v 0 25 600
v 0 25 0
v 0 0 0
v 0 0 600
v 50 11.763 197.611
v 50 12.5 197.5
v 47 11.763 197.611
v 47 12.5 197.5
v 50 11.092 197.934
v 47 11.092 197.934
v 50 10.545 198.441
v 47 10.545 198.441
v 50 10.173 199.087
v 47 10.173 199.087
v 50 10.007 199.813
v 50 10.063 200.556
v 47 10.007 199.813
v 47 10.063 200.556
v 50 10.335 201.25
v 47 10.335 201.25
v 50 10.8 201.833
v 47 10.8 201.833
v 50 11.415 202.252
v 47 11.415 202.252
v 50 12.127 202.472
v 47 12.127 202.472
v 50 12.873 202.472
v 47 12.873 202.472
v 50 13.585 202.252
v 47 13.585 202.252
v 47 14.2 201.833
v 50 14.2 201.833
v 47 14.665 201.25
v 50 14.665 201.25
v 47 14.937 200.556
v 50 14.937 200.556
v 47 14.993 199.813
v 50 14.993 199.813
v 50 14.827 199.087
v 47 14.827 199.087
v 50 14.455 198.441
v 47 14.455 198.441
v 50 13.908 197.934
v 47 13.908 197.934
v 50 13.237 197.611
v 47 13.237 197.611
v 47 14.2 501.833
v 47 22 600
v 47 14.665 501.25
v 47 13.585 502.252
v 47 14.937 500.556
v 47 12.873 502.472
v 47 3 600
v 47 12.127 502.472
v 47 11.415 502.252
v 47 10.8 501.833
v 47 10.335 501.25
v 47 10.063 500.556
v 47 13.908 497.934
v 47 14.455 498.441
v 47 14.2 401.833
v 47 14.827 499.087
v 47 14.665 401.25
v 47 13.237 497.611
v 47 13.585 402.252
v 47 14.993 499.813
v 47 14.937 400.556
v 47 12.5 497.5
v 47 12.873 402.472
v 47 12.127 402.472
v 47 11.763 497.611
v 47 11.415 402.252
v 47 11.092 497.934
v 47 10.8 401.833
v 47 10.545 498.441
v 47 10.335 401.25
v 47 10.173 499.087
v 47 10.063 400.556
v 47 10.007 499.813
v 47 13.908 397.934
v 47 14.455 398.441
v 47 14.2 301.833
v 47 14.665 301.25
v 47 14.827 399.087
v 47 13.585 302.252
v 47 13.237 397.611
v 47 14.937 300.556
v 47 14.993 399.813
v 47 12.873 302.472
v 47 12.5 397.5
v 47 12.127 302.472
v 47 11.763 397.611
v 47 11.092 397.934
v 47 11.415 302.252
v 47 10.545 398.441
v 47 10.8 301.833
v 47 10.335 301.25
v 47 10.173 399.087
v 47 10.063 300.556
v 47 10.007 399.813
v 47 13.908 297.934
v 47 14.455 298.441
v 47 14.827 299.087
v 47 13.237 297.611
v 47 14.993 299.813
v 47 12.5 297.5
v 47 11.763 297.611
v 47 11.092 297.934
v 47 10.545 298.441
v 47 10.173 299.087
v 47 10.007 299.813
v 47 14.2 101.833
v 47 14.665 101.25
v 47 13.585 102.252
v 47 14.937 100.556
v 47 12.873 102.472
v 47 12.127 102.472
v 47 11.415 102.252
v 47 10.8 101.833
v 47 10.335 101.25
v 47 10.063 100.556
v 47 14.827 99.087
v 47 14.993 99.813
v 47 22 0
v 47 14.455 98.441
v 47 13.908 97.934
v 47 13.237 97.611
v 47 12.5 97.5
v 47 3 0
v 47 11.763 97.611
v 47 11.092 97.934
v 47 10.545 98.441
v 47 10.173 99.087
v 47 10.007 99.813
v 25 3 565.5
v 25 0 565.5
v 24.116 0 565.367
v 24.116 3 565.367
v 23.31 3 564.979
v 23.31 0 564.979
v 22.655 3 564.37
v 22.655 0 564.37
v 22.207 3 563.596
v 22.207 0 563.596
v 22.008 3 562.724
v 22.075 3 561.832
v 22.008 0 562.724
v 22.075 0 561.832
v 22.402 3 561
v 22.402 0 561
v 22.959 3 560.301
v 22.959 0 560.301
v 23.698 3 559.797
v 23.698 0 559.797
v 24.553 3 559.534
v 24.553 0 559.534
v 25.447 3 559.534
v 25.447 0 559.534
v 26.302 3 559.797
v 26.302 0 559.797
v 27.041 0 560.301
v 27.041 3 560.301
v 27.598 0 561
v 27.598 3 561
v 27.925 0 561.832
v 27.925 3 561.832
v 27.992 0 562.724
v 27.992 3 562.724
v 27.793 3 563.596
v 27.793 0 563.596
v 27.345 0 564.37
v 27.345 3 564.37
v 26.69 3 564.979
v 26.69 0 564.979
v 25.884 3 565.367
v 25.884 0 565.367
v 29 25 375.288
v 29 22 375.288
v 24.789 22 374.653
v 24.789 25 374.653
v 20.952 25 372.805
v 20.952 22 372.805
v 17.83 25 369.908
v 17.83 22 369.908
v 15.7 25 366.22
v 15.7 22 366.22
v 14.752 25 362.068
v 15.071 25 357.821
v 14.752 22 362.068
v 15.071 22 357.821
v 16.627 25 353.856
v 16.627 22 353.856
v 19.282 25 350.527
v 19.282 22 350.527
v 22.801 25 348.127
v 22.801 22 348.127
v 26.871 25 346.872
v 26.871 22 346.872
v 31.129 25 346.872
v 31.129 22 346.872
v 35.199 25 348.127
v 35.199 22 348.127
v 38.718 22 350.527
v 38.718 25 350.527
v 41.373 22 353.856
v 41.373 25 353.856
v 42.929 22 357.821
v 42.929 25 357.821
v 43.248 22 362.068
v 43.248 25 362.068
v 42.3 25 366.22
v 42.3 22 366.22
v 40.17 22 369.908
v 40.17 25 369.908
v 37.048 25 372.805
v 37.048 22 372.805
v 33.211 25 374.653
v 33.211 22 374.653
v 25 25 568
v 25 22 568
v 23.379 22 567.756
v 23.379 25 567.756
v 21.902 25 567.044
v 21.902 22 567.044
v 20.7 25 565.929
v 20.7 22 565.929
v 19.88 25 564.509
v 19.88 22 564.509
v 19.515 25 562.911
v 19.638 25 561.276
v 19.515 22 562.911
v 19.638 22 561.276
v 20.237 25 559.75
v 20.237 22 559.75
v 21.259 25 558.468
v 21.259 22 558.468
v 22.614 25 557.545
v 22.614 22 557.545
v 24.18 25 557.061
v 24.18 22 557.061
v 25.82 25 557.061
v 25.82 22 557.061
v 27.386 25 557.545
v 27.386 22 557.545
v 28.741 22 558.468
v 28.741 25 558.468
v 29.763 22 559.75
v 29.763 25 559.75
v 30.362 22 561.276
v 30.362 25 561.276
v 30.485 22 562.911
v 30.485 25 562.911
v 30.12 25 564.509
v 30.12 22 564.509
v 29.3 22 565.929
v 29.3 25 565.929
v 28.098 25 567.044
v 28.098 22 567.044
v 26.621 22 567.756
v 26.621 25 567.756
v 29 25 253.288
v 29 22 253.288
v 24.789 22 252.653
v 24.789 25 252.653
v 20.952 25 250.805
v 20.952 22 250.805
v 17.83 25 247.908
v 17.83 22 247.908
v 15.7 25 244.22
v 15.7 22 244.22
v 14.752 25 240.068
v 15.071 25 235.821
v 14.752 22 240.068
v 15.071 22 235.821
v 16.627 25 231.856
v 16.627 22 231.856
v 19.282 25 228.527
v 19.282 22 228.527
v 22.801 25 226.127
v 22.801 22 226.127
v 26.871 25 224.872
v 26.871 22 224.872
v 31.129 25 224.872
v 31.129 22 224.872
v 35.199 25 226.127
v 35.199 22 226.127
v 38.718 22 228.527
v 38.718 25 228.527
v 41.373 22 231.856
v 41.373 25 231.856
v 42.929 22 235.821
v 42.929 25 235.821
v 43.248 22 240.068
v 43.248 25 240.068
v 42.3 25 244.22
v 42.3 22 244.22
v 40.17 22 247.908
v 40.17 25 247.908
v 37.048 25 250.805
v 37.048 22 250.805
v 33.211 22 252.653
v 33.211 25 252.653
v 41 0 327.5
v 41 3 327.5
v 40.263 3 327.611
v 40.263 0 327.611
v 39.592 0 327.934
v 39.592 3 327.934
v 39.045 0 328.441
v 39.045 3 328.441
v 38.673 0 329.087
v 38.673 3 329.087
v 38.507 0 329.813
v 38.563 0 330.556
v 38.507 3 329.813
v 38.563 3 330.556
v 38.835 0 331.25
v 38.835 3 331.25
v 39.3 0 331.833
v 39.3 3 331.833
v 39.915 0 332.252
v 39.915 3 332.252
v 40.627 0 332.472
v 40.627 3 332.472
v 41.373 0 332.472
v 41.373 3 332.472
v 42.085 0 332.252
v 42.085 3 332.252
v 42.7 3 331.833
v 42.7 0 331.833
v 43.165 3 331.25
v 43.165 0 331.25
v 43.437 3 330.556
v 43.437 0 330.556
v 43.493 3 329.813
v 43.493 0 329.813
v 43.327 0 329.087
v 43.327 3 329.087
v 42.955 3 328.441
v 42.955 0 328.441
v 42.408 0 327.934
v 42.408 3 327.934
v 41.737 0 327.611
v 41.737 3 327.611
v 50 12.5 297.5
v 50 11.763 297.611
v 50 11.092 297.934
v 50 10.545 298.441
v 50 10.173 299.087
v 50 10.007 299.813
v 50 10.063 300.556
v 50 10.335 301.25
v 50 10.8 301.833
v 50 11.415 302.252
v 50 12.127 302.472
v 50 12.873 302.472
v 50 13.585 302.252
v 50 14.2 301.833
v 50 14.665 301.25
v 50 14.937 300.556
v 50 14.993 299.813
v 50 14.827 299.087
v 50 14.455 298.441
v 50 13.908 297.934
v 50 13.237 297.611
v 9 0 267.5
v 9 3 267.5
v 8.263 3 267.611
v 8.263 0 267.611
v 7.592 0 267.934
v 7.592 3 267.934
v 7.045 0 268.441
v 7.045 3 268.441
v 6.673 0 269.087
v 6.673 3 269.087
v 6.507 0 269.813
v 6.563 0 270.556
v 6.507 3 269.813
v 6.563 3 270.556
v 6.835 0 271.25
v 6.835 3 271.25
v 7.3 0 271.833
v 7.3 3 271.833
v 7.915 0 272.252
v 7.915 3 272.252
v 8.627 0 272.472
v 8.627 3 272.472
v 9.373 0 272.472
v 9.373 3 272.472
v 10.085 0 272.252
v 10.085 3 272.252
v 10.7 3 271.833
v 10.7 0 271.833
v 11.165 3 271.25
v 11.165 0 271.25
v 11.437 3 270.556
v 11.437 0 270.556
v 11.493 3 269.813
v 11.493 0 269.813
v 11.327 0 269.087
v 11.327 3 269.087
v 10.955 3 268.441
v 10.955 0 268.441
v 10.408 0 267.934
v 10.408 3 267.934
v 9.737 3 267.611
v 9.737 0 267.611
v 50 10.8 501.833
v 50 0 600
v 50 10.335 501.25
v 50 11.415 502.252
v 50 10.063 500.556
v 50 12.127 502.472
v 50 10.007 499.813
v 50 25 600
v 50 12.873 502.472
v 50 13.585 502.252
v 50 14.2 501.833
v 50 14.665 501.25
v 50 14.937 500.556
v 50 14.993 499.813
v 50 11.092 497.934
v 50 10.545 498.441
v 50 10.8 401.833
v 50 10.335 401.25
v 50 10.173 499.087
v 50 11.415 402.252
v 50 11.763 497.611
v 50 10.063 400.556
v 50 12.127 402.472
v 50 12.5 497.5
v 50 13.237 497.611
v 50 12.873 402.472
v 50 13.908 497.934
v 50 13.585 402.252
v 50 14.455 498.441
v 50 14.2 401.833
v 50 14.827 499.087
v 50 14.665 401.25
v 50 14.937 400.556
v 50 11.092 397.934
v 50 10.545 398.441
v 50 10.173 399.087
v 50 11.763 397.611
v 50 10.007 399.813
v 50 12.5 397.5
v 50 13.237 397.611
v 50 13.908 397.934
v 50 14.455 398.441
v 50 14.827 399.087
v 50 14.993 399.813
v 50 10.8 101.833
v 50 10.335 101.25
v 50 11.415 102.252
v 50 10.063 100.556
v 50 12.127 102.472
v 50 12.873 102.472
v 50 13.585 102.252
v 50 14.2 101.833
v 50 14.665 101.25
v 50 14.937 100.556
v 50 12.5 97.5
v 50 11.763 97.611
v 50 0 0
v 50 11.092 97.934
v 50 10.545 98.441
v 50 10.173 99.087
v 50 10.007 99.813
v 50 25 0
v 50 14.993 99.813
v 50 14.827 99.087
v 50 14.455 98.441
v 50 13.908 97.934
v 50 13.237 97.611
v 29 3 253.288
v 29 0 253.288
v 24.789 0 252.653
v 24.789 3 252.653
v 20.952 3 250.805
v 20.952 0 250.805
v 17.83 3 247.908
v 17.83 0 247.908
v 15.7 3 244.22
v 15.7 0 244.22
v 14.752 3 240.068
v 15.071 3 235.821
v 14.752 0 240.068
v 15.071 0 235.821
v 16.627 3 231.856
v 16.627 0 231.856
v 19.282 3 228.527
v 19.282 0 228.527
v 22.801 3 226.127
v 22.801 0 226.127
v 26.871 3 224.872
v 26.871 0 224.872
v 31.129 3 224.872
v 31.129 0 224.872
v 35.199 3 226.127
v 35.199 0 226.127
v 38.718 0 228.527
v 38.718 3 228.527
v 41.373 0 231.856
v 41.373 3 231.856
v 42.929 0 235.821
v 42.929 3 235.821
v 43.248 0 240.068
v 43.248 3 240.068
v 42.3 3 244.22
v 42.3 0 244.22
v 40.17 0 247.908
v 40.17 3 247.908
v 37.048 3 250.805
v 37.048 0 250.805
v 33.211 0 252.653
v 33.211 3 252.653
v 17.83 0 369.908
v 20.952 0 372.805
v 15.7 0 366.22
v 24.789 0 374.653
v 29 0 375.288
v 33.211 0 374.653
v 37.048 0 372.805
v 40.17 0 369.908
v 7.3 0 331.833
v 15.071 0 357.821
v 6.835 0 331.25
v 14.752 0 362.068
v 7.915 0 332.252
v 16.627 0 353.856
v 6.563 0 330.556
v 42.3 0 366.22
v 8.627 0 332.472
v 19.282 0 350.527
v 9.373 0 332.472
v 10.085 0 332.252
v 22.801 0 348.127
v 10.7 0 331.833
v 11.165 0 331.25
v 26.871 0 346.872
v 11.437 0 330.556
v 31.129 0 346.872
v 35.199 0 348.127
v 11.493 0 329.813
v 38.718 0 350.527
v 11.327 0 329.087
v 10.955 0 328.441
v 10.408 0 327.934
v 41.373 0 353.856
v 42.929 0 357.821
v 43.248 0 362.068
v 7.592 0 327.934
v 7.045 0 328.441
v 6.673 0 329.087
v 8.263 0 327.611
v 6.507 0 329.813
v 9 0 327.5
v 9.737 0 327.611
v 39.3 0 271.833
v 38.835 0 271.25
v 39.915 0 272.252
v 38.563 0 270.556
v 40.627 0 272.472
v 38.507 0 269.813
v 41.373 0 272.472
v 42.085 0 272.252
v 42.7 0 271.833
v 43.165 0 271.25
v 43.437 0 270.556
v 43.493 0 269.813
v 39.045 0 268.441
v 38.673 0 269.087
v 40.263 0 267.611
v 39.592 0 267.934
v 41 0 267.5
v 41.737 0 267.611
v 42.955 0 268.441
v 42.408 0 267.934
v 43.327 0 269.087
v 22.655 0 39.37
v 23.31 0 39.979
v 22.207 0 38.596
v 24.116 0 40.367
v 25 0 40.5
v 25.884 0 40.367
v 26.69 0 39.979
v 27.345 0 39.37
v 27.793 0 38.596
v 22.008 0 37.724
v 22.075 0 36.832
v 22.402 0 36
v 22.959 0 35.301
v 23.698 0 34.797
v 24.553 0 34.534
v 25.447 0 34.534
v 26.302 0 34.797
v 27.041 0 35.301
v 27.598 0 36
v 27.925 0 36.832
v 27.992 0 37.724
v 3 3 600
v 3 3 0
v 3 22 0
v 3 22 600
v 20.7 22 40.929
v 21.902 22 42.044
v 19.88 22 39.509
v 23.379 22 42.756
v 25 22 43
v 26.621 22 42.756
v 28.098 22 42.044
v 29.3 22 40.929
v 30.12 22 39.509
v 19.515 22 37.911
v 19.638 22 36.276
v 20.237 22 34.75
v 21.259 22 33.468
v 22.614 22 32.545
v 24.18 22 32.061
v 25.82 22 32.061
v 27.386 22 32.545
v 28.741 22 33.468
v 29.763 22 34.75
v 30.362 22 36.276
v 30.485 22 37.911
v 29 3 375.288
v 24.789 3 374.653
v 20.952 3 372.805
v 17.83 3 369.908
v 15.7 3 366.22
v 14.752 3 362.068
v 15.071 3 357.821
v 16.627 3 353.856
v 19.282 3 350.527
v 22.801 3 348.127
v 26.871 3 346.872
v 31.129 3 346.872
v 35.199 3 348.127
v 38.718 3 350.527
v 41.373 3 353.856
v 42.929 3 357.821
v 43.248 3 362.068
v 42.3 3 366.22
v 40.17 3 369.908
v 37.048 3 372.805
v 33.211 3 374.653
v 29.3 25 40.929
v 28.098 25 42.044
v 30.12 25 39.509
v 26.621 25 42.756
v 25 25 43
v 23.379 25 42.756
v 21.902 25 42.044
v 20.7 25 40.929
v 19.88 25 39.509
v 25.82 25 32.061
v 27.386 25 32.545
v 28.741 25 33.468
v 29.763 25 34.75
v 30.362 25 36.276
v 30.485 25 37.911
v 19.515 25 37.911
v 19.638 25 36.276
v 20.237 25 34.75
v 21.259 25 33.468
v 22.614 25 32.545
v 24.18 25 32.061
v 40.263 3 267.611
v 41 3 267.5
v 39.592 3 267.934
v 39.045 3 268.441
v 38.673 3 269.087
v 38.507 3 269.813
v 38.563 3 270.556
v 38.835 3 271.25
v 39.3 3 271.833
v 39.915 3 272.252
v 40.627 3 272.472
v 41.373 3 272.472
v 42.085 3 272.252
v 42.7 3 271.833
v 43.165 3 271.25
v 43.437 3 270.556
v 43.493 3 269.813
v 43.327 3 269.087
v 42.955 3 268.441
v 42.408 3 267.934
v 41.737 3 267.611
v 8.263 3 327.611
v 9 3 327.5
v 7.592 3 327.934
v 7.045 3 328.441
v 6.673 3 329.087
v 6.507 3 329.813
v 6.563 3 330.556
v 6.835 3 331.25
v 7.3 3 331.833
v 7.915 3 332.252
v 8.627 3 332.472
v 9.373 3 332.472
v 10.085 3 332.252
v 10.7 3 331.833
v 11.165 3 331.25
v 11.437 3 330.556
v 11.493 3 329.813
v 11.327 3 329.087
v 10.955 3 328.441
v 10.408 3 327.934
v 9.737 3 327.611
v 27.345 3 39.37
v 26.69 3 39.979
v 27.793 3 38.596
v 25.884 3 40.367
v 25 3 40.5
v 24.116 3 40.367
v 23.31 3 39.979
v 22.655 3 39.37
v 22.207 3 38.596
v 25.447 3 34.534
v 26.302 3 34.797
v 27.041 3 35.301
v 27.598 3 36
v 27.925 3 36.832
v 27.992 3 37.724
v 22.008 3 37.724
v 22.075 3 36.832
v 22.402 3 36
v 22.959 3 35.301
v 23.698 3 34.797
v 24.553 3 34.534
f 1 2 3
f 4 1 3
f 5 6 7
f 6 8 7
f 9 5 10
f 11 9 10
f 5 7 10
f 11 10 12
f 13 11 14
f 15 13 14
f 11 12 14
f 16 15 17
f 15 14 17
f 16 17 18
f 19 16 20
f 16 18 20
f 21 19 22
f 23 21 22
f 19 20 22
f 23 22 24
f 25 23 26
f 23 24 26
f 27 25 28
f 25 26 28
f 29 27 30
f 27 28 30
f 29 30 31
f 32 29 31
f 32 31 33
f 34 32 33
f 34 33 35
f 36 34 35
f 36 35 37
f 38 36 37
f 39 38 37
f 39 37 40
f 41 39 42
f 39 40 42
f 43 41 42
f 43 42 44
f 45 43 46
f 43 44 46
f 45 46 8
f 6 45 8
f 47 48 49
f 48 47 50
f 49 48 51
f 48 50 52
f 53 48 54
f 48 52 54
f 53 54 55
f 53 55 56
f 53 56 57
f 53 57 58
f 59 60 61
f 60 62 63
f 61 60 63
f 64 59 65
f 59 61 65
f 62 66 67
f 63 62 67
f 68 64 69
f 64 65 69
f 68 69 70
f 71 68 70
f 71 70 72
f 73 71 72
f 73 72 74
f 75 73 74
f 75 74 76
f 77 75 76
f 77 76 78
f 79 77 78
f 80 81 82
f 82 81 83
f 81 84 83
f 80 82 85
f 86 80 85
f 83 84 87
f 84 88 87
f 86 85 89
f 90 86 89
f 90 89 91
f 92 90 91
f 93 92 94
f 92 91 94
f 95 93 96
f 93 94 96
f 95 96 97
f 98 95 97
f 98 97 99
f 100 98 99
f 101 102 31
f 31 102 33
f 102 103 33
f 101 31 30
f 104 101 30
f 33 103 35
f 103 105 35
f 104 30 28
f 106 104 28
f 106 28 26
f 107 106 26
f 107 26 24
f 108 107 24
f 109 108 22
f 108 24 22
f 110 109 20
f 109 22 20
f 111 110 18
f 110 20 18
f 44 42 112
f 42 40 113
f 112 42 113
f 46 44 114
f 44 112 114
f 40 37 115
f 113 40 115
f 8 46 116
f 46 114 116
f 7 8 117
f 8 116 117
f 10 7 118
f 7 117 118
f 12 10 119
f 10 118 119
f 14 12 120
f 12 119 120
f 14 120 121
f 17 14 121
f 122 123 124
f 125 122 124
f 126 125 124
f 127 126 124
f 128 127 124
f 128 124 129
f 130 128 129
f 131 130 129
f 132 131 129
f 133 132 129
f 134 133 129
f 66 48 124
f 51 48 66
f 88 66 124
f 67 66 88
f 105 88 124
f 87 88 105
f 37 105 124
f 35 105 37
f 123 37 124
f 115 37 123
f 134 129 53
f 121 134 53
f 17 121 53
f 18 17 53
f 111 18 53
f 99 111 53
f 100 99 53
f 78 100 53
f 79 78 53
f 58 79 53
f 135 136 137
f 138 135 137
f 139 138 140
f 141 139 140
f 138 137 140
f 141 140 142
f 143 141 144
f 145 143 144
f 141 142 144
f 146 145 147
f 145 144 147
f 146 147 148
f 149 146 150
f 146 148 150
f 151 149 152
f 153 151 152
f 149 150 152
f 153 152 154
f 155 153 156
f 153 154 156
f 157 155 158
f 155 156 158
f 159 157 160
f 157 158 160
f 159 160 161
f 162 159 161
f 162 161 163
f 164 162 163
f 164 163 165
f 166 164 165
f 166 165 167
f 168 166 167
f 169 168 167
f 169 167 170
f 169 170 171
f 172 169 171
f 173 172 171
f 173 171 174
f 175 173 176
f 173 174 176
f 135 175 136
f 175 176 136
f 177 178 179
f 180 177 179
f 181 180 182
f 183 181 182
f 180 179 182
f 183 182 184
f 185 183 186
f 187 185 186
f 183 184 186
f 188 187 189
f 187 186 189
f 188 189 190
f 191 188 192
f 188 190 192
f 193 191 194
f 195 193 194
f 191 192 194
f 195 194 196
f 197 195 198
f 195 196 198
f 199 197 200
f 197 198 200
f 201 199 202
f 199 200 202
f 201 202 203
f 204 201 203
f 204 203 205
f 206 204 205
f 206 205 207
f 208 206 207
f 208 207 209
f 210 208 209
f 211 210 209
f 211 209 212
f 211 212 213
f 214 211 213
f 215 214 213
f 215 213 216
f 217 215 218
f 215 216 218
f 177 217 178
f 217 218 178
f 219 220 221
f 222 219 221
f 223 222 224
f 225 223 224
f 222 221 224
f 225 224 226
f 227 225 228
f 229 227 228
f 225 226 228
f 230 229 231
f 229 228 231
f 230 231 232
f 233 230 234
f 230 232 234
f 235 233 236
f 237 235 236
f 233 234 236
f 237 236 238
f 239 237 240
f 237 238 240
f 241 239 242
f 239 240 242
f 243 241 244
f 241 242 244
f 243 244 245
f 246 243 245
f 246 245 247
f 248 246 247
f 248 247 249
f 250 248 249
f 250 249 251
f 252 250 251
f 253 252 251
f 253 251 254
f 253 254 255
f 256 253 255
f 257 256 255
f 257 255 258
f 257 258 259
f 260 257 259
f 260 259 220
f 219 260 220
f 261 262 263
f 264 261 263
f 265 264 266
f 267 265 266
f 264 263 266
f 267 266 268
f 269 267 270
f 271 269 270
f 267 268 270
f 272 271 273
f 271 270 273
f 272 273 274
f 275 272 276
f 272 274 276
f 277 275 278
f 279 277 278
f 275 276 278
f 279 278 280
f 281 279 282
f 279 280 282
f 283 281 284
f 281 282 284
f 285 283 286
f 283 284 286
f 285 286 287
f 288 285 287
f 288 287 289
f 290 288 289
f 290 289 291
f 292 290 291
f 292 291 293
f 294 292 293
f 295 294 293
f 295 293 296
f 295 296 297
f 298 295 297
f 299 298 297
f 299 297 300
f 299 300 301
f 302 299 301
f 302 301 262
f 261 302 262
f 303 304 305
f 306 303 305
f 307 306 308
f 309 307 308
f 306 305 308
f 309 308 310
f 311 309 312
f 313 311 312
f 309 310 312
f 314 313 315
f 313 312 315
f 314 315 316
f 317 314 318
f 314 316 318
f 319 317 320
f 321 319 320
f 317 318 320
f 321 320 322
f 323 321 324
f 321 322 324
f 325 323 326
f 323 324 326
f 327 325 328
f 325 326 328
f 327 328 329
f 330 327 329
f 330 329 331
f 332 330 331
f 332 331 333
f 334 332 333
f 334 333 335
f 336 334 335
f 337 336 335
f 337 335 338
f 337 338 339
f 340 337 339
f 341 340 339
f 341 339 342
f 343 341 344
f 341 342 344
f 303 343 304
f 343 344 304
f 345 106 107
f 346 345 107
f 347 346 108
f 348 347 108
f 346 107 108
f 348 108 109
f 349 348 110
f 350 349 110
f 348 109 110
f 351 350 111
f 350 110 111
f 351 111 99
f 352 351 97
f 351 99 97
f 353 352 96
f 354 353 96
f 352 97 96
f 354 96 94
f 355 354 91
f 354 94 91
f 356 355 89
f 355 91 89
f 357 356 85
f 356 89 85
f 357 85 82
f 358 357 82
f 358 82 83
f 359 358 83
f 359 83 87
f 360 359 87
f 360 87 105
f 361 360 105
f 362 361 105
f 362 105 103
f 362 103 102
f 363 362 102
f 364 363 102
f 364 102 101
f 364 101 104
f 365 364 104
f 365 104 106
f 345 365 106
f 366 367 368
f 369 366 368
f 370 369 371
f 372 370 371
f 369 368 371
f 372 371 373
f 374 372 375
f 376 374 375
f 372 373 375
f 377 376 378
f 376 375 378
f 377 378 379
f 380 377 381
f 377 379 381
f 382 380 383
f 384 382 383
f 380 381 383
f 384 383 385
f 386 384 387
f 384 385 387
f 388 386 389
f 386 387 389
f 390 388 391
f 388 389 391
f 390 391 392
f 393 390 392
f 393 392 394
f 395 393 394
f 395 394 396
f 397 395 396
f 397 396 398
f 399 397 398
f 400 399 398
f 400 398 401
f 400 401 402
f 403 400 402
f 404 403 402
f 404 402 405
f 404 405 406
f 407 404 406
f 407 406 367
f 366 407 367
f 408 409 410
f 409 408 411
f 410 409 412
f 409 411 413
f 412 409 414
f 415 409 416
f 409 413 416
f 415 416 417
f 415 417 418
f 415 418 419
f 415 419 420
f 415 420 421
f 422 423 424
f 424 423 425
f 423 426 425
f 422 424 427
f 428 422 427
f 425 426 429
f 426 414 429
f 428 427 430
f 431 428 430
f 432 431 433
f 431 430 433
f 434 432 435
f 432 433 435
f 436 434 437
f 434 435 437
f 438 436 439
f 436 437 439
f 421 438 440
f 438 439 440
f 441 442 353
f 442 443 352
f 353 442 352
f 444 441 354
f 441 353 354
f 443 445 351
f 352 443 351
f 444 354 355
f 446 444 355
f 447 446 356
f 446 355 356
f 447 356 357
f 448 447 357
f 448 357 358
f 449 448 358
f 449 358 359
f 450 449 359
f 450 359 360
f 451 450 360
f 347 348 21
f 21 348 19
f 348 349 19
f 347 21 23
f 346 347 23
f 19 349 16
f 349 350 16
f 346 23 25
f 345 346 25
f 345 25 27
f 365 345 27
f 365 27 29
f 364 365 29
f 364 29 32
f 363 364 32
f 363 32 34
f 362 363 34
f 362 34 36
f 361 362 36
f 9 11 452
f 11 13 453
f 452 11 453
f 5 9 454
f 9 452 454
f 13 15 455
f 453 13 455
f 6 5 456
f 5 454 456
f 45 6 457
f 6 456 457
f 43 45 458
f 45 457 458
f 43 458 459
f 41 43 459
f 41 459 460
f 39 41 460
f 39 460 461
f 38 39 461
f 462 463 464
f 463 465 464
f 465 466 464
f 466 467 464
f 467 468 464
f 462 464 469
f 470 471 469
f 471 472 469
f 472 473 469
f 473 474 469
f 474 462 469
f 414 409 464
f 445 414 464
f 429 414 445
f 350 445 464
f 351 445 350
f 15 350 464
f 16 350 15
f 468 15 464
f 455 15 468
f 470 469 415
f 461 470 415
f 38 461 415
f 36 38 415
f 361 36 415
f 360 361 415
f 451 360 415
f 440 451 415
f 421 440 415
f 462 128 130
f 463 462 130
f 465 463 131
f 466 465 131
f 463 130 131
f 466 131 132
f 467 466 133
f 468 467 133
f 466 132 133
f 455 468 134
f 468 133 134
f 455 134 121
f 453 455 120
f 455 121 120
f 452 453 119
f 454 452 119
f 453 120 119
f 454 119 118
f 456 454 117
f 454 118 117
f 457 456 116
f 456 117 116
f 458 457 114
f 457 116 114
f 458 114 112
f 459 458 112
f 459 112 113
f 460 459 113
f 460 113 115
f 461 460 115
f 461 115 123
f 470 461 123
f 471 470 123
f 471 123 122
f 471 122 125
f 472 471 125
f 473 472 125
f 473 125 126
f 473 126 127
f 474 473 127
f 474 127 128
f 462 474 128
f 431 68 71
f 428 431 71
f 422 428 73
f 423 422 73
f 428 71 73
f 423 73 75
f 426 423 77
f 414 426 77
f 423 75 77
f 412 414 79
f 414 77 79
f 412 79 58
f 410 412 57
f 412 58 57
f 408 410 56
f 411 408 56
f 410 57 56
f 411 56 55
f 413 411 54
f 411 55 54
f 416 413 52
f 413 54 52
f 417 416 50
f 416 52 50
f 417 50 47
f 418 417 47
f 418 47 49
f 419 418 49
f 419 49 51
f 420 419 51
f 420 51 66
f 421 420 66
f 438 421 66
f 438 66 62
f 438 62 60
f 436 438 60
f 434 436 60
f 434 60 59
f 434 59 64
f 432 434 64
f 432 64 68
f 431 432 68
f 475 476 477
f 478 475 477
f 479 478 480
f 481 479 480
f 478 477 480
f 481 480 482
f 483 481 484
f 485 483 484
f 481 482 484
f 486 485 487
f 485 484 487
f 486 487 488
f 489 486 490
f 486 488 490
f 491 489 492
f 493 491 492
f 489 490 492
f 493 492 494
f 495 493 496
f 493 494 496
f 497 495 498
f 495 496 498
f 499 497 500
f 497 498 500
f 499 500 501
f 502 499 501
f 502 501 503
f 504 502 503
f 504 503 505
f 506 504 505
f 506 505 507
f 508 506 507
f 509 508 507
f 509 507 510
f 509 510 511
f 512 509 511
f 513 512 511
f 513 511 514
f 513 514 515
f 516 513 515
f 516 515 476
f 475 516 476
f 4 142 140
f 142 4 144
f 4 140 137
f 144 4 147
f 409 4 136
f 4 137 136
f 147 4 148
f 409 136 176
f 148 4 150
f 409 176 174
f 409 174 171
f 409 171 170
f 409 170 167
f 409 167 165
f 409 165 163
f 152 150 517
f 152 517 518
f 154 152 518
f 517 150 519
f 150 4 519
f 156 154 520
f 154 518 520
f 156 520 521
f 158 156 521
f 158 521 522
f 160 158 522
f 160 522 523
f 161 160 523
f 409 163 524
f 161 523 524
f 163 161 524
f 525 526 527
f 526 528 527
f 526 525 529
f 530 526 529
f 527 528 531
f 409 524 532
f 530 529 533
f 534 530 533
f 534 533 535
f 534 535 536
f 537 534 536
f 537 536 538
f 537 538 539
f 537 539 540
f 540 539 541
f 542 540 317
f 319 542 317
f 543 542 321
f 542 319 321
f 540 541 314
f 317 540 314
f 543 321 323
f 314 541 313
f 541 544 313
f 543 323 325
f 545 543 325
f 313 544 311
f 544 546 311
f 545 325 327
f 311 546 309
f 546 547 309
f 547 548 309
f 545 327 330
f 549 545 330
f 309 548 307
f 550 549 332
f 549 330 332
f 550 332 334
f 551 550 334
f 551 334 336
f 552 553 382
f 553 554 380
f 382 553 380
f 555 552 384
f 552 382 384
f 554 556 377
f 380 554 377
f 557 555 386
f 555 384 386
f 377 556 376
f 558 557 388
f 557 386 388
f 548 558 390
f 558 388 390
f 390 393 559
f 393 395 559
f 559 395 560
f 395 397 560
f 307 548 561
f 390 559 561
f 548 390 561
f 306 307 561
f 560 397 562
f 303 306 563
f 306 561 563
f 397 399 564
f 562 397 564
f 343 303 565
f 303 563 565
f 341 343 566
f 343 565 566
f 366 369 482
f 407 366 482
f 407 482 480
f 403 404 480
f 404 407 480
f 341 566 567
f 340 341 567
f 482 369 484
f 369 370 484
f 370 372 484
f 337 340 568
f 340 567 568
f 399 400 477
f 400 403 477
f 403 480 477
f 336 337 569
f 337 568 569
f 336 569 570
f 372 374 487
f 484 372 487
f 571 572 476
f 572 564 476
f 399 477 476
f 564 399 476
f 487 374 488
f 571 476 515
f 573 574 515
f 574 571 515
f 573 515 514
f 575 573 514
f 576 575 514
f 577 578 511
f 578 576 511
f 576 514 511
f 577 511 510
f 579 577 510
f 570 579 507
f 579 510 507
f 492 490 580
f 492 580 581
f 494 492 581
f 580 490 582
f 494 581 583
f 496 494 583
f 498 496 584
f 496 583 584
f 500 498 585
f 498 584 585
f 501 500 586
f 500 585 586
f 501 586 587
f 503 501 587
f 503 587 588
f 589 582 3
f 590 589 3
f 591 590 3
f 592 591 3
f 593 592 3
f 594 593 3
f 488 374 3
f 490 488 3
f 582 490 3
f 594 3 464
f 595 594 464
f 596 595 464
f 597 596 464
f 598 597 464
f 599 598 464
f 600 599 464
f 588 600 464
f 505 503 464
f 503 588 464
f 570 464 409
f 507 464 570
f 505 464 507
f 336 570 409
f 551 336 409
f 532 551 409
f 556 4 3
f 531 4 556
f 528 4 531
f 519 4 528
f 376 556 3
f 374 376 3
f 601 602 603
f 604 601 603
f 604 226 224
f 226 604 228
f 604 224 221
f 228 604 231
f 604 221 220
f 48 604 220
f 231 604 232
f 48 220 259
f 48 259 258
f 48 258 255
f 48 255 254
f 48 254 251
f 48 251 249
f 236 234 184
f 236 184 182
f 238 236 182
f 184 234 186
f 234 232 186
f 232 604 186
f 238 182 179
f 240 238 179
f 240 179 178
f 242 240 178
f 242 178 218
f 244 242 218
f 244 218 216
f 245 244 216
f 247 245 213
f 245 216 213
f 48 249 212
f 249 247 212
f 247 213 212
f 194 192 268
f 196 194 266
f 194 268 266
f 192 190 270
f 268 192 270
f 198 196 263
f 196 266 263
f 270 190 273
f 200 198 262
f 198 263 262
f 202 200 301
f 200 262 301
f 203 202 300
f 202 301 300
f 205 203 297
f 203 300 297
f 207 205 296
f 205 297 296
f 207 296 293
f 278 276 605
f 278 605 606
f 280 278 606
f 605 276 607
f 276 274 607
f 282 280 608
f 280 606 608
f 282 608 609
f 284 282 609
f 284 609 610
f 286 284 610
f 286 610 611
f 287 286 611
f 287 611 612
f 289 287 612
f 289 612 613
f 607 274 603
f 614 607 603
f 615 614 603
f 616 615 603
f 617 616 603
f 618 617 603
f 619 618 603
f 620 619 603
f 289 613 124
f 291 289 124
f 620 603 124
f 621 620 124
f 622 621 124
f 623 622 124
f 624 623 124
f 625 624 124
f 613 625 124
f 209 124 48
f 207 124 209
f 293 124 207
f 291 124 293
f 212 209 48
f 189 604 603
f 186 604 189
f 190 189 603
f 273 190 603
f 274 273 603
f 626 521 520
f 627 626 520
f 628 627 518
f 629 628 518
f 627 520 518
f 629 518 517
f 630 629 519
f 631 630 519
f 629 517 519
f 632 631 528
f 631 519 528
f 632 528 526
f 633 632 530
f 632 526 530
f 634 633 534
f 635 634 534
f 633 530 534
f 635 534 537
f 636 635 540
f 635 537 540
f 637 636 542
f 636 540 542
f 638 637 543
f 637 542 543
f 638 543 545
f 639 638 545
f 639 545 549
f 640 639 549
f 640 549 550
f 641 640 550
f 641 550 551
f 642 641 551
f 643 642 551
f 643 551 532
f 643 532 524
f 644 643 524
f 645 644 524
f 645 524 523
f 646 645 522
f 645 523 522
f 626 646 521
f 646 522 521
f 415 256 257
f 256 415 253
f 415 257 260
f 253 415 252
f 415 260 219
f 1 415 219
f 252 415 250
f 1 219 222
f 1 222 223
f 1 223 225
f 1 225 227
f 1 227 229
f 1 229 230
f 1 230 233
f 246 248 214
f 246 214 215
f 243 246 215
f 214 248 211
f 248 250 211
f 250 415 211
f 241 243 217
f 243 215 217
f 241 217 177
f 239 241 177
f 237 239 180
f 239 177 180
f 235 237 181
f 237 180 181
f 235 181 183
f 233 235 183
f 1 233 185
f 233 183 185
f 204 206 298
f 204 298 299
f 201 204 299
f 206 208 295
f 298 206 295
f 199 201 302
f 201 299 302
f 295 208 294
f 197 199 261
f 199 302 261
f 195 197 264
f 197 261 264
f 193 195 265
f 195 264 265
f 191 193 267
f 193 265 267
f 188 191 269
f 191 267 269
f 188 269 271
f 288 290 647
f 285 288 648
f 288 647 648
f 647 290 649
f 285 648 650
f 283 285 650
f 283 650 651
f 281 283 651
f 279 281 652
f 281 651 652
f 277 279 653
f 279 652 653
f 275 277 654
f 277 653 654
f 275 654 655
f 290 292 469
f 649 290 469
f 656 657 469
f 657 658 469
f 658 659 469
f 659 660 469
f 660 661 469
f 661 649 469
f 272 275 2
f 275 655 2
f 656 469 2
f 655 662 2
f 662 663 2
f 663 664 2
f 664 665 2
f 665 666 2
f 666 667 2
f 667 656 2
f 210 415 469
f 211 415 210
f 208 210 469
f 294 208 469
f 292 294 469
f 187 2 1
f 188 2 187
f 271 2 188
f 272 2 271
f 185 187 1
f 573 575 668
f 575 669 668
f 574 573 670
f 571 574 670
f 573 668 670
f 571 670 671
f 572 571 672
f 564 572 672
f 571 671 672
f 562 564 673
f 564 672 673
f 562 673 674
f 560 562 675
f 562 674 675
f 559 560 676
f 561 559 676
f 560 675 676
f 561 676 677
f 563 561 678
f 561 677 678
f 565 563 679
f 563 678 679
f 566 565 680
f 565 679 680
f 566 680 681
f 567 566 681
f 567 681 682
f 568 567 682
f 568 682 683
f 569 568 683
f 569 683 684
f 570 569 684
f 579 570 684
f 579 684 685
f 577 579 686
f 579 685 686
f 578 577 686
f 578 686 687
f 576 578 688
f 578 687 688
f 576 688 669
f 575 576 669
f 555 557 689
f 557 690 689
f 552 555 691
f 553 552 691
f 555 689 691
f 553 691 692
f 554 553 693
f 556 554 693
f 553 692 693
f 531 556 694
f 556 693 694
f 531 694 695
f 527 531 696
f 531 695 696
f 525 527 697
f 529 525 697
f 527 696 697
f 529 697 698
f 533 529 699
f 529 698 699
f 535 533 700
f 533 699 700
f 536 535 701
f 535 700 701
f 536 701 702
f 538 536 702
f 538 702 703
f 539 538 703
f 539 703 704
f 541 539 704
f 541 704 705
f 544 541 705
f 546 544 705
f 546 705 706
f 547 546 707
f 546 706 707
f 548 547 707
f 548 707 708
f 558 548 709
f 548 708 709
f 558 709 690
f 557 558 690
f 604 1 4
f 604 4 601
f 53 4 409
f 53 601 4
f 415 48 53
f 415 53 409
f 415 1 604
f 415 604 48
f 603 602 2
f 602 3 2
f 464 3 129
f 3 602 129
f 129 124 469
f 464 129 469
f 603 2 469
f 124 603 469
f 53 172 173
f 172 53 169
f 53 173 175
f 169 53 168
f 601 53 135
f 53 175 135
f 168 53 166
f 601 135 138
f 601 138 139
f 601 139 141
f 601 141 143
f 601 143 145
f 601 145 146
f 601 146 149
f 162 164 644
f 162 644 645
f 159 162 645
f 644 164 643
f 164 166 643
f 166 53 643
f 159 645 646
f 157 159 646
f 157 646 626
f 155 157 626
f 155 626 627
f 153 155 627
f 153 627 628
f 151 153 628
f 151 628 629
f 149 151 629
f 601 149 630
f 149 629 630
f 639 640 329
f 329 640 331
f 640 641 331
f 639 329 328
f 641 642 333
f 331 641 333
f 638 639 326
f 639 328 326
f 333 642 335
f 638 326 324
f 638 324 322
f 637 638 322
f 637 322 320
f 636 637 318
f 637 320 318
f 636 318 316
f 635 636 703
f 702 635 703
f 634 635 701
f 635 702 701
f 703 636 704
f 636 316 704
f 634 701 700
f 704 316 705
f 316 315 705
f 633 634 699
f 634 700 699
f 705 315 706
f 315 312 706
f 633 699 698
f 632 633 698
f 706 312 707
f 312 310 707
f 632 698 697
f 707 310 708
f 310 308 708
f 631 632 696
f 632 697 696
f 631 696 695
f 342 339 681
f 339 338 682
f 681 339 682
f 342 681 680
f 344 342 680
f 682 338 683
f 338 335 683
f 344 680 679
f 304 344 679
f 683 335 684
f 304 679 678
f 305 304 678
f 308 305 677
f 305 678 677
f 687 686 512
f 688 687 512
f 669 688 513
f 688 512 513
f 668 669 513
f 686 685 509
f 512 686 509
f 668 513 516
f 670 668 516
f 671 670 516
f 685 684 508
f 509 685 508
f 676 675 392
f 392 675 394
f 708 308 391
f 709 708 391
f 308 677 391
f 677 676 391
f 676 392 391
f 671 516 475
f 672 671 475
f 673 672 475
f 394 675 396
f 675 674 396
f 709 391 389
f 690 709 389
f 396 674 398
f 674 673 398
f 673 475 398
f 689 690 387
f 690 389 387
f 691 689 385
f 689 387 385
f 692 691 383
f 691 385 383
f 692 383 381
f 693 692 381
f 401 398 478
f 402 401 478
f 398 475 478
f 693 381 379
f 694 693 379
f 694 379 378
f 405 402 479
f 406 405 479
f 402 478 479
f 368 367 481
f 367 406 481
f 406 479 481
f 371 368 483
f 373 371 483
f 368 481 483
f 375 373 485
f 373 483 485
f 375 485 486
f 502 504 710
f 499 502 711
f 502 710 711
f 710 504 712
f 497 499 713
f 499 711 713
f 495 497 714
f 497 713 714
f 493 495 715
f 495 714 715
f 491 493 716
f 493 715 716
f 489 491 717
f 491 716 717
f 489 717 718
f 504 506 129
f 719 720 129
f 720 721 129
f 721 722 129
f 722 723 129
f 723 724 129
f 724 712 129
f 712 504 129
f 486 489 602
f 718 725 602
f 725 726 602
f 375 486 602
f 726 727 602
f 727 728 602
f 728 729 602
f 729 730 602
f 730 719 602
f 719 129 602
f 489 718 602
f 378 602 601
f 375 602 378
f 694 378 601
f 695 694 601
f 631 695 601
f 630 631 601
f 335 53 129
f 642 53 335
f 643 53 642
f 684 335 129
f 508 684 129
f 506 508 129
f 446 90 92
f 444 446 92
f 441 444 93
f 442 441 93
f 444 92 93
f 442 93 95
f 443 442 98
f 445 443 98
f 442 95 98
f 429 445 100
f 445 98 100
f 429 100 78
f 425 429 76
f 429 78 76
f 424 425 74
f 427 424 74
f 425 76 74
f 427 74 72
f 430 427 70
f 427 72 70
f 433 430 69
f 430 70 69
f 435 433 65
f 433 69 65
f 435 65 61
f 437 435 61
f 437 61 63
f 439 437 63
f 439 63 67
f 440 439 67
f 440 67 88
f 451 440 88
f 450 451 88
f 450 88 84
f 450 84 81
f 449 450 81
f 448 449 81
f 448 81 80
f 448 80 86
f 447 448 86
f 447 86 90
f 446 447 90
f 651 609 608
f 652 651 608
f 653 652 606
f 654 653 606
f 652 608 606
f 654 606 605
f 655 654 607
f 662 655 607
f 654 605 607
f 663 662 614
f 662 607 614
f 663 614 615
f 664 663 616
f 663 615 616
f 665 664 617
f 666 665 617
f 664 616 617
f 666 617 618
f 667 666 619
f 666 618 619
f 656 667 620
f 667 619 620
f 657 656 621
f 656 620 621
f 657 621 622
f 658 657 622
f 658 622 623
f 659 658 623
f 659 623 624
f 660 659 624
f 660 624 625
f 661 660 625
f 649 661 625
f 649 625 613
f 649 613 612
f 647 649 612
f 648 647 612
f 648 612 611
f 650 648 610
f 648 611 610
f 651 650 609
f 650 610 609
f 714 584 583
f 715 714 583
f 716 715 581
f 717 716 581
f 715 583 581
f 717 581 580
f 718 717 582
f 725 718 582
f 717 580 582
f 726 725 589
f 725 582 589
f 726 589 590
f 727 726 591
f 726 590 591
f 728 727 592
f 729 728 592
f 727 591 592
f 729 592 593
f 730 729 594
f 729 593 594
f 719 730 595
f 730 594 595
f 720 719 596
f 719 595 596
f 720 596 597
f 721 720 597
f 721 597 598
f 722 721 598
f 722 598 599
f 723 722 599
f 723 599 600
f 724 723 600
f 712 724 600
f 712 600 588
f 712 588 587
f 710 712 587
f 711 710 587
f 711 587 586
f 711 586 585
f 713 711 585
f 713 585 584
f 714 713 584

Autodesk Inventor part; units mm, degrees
ref_plane "YZ Plane" through (0, 0, 0) normal (1, 0, 0) x (0, 1, 0)
ref_plane "XZ Plane" through (0, 0, 0) normal (0, 1, 0) x (-1, 0, 0)
ref_plane "XY Plane" through (0, 0, 0) normal (0, 0, 1) x (1, 0, 0)
sketch "Sketch1" plane through (0, 0, 0) normal (0, 0, 1) x (1, 0, 0)
  line L0 (0, 0) -> (50, 0)
  line L1 (50, 0) -> (50, 25)
  line L2 (50, 25) -> (0, 25)
  line L3 (0, 25) -> (0, 0)
  line L4 (47, 3) -> (3, 3)
  line L5 (3, 3) -> (3, 22)
  line L6 (3, 22) -> (47, 22)
  line L7 (47, 22) -> (47, 3)
  dimension "d0" = 50
  dimension "d1" = 25
  dimension "d2" = 3
extrude "Extrusion1" add sketch "Sketch1" along normal blind 600
sketch "Sketch2" plane through (0, 25, 0) normal (0, 1, 0) x (1, 0, 0)
  line L0 (50, -600) -> (0, -600) projected
  point P0 (0, 0)
  point P1 (25, -562.5)
  point P2 (25, -37.5)
  dimension "d5" = 37.5
  dimension "d6" = 37.5
  dimension "d7" = 25
hole "Hole1" at (25, 25, 562.5) at (25, 25, 37.5) direction (0, -1, 0) diameter 6 end through all counterbore diameter 11 counterbore depth 5
sketch "Sketch4" plane through (50, 0, 0) normal (1, 0, 0) x (0, 0, -1)
  line L0 (0, 0) -> (66.9632, 0)
  point P0 (-100, 12.5)
  point P1 (-200, 12.5)
  point P2 (-300, 12.5)
  point P3 (-400, 12.5)
  point P4 (-500, 12.5)
  dimension "d31" = 100
  dimension "d32" = 12.5
  dimension "d36" = 100
hole "Hole3" at (50, 12.5, 100) at (50, 12.5, 200) at (50, 12.5, 300) at (50, 12.5, 400) at (50, 12.5, 500) direction (-1, 0, 0) diameter 5 depth 8 tip angle 118
sketch "Sketch6" plane through (0, 25, 0) normal (0, 1, 0) x (1, 0, 0)
  line L0 (50, -600) -> (0, -600) projected
  point P0 (0, 0)
  point P1 (29, -239)
  point P2 (29, -361)
  dimension "d60" = 239
  dimension "d61" = 29
  dimension "d69" = 239
hole "Hole5" at (29, 25, 239) at (29, 25, 361) direction (0, -1, 0) diameter 28.575 end through all
sketch "Sketch7" plane through (0, 0, 0) normal (0, 1, 0) x (1, 0, 0)
  line L0 (50, 0) -> (50, -600) projected
  line L1 (50, 0) -> (0, 0) projected
  point P0 (41, -330)
  point P1 (9, -330)
  point P2 (9, -270)
  point P3 (41, -270)
  dimension "d70" = 9
  dimension "d71" = 9
  dimension "d72" = 60
  dimension "d73" = 600
  dimension "d74" = 270
hole "Hole6" at (41, 0, 330) at (9, 0, 330) at (9, 0, 270) at (41, 0, 270) direction (0, 1, 0) diameter 5 depth 8
equation "\"d69\" = d60"
equation "\"d71\" = d70"
properties part number "Back Bar"
